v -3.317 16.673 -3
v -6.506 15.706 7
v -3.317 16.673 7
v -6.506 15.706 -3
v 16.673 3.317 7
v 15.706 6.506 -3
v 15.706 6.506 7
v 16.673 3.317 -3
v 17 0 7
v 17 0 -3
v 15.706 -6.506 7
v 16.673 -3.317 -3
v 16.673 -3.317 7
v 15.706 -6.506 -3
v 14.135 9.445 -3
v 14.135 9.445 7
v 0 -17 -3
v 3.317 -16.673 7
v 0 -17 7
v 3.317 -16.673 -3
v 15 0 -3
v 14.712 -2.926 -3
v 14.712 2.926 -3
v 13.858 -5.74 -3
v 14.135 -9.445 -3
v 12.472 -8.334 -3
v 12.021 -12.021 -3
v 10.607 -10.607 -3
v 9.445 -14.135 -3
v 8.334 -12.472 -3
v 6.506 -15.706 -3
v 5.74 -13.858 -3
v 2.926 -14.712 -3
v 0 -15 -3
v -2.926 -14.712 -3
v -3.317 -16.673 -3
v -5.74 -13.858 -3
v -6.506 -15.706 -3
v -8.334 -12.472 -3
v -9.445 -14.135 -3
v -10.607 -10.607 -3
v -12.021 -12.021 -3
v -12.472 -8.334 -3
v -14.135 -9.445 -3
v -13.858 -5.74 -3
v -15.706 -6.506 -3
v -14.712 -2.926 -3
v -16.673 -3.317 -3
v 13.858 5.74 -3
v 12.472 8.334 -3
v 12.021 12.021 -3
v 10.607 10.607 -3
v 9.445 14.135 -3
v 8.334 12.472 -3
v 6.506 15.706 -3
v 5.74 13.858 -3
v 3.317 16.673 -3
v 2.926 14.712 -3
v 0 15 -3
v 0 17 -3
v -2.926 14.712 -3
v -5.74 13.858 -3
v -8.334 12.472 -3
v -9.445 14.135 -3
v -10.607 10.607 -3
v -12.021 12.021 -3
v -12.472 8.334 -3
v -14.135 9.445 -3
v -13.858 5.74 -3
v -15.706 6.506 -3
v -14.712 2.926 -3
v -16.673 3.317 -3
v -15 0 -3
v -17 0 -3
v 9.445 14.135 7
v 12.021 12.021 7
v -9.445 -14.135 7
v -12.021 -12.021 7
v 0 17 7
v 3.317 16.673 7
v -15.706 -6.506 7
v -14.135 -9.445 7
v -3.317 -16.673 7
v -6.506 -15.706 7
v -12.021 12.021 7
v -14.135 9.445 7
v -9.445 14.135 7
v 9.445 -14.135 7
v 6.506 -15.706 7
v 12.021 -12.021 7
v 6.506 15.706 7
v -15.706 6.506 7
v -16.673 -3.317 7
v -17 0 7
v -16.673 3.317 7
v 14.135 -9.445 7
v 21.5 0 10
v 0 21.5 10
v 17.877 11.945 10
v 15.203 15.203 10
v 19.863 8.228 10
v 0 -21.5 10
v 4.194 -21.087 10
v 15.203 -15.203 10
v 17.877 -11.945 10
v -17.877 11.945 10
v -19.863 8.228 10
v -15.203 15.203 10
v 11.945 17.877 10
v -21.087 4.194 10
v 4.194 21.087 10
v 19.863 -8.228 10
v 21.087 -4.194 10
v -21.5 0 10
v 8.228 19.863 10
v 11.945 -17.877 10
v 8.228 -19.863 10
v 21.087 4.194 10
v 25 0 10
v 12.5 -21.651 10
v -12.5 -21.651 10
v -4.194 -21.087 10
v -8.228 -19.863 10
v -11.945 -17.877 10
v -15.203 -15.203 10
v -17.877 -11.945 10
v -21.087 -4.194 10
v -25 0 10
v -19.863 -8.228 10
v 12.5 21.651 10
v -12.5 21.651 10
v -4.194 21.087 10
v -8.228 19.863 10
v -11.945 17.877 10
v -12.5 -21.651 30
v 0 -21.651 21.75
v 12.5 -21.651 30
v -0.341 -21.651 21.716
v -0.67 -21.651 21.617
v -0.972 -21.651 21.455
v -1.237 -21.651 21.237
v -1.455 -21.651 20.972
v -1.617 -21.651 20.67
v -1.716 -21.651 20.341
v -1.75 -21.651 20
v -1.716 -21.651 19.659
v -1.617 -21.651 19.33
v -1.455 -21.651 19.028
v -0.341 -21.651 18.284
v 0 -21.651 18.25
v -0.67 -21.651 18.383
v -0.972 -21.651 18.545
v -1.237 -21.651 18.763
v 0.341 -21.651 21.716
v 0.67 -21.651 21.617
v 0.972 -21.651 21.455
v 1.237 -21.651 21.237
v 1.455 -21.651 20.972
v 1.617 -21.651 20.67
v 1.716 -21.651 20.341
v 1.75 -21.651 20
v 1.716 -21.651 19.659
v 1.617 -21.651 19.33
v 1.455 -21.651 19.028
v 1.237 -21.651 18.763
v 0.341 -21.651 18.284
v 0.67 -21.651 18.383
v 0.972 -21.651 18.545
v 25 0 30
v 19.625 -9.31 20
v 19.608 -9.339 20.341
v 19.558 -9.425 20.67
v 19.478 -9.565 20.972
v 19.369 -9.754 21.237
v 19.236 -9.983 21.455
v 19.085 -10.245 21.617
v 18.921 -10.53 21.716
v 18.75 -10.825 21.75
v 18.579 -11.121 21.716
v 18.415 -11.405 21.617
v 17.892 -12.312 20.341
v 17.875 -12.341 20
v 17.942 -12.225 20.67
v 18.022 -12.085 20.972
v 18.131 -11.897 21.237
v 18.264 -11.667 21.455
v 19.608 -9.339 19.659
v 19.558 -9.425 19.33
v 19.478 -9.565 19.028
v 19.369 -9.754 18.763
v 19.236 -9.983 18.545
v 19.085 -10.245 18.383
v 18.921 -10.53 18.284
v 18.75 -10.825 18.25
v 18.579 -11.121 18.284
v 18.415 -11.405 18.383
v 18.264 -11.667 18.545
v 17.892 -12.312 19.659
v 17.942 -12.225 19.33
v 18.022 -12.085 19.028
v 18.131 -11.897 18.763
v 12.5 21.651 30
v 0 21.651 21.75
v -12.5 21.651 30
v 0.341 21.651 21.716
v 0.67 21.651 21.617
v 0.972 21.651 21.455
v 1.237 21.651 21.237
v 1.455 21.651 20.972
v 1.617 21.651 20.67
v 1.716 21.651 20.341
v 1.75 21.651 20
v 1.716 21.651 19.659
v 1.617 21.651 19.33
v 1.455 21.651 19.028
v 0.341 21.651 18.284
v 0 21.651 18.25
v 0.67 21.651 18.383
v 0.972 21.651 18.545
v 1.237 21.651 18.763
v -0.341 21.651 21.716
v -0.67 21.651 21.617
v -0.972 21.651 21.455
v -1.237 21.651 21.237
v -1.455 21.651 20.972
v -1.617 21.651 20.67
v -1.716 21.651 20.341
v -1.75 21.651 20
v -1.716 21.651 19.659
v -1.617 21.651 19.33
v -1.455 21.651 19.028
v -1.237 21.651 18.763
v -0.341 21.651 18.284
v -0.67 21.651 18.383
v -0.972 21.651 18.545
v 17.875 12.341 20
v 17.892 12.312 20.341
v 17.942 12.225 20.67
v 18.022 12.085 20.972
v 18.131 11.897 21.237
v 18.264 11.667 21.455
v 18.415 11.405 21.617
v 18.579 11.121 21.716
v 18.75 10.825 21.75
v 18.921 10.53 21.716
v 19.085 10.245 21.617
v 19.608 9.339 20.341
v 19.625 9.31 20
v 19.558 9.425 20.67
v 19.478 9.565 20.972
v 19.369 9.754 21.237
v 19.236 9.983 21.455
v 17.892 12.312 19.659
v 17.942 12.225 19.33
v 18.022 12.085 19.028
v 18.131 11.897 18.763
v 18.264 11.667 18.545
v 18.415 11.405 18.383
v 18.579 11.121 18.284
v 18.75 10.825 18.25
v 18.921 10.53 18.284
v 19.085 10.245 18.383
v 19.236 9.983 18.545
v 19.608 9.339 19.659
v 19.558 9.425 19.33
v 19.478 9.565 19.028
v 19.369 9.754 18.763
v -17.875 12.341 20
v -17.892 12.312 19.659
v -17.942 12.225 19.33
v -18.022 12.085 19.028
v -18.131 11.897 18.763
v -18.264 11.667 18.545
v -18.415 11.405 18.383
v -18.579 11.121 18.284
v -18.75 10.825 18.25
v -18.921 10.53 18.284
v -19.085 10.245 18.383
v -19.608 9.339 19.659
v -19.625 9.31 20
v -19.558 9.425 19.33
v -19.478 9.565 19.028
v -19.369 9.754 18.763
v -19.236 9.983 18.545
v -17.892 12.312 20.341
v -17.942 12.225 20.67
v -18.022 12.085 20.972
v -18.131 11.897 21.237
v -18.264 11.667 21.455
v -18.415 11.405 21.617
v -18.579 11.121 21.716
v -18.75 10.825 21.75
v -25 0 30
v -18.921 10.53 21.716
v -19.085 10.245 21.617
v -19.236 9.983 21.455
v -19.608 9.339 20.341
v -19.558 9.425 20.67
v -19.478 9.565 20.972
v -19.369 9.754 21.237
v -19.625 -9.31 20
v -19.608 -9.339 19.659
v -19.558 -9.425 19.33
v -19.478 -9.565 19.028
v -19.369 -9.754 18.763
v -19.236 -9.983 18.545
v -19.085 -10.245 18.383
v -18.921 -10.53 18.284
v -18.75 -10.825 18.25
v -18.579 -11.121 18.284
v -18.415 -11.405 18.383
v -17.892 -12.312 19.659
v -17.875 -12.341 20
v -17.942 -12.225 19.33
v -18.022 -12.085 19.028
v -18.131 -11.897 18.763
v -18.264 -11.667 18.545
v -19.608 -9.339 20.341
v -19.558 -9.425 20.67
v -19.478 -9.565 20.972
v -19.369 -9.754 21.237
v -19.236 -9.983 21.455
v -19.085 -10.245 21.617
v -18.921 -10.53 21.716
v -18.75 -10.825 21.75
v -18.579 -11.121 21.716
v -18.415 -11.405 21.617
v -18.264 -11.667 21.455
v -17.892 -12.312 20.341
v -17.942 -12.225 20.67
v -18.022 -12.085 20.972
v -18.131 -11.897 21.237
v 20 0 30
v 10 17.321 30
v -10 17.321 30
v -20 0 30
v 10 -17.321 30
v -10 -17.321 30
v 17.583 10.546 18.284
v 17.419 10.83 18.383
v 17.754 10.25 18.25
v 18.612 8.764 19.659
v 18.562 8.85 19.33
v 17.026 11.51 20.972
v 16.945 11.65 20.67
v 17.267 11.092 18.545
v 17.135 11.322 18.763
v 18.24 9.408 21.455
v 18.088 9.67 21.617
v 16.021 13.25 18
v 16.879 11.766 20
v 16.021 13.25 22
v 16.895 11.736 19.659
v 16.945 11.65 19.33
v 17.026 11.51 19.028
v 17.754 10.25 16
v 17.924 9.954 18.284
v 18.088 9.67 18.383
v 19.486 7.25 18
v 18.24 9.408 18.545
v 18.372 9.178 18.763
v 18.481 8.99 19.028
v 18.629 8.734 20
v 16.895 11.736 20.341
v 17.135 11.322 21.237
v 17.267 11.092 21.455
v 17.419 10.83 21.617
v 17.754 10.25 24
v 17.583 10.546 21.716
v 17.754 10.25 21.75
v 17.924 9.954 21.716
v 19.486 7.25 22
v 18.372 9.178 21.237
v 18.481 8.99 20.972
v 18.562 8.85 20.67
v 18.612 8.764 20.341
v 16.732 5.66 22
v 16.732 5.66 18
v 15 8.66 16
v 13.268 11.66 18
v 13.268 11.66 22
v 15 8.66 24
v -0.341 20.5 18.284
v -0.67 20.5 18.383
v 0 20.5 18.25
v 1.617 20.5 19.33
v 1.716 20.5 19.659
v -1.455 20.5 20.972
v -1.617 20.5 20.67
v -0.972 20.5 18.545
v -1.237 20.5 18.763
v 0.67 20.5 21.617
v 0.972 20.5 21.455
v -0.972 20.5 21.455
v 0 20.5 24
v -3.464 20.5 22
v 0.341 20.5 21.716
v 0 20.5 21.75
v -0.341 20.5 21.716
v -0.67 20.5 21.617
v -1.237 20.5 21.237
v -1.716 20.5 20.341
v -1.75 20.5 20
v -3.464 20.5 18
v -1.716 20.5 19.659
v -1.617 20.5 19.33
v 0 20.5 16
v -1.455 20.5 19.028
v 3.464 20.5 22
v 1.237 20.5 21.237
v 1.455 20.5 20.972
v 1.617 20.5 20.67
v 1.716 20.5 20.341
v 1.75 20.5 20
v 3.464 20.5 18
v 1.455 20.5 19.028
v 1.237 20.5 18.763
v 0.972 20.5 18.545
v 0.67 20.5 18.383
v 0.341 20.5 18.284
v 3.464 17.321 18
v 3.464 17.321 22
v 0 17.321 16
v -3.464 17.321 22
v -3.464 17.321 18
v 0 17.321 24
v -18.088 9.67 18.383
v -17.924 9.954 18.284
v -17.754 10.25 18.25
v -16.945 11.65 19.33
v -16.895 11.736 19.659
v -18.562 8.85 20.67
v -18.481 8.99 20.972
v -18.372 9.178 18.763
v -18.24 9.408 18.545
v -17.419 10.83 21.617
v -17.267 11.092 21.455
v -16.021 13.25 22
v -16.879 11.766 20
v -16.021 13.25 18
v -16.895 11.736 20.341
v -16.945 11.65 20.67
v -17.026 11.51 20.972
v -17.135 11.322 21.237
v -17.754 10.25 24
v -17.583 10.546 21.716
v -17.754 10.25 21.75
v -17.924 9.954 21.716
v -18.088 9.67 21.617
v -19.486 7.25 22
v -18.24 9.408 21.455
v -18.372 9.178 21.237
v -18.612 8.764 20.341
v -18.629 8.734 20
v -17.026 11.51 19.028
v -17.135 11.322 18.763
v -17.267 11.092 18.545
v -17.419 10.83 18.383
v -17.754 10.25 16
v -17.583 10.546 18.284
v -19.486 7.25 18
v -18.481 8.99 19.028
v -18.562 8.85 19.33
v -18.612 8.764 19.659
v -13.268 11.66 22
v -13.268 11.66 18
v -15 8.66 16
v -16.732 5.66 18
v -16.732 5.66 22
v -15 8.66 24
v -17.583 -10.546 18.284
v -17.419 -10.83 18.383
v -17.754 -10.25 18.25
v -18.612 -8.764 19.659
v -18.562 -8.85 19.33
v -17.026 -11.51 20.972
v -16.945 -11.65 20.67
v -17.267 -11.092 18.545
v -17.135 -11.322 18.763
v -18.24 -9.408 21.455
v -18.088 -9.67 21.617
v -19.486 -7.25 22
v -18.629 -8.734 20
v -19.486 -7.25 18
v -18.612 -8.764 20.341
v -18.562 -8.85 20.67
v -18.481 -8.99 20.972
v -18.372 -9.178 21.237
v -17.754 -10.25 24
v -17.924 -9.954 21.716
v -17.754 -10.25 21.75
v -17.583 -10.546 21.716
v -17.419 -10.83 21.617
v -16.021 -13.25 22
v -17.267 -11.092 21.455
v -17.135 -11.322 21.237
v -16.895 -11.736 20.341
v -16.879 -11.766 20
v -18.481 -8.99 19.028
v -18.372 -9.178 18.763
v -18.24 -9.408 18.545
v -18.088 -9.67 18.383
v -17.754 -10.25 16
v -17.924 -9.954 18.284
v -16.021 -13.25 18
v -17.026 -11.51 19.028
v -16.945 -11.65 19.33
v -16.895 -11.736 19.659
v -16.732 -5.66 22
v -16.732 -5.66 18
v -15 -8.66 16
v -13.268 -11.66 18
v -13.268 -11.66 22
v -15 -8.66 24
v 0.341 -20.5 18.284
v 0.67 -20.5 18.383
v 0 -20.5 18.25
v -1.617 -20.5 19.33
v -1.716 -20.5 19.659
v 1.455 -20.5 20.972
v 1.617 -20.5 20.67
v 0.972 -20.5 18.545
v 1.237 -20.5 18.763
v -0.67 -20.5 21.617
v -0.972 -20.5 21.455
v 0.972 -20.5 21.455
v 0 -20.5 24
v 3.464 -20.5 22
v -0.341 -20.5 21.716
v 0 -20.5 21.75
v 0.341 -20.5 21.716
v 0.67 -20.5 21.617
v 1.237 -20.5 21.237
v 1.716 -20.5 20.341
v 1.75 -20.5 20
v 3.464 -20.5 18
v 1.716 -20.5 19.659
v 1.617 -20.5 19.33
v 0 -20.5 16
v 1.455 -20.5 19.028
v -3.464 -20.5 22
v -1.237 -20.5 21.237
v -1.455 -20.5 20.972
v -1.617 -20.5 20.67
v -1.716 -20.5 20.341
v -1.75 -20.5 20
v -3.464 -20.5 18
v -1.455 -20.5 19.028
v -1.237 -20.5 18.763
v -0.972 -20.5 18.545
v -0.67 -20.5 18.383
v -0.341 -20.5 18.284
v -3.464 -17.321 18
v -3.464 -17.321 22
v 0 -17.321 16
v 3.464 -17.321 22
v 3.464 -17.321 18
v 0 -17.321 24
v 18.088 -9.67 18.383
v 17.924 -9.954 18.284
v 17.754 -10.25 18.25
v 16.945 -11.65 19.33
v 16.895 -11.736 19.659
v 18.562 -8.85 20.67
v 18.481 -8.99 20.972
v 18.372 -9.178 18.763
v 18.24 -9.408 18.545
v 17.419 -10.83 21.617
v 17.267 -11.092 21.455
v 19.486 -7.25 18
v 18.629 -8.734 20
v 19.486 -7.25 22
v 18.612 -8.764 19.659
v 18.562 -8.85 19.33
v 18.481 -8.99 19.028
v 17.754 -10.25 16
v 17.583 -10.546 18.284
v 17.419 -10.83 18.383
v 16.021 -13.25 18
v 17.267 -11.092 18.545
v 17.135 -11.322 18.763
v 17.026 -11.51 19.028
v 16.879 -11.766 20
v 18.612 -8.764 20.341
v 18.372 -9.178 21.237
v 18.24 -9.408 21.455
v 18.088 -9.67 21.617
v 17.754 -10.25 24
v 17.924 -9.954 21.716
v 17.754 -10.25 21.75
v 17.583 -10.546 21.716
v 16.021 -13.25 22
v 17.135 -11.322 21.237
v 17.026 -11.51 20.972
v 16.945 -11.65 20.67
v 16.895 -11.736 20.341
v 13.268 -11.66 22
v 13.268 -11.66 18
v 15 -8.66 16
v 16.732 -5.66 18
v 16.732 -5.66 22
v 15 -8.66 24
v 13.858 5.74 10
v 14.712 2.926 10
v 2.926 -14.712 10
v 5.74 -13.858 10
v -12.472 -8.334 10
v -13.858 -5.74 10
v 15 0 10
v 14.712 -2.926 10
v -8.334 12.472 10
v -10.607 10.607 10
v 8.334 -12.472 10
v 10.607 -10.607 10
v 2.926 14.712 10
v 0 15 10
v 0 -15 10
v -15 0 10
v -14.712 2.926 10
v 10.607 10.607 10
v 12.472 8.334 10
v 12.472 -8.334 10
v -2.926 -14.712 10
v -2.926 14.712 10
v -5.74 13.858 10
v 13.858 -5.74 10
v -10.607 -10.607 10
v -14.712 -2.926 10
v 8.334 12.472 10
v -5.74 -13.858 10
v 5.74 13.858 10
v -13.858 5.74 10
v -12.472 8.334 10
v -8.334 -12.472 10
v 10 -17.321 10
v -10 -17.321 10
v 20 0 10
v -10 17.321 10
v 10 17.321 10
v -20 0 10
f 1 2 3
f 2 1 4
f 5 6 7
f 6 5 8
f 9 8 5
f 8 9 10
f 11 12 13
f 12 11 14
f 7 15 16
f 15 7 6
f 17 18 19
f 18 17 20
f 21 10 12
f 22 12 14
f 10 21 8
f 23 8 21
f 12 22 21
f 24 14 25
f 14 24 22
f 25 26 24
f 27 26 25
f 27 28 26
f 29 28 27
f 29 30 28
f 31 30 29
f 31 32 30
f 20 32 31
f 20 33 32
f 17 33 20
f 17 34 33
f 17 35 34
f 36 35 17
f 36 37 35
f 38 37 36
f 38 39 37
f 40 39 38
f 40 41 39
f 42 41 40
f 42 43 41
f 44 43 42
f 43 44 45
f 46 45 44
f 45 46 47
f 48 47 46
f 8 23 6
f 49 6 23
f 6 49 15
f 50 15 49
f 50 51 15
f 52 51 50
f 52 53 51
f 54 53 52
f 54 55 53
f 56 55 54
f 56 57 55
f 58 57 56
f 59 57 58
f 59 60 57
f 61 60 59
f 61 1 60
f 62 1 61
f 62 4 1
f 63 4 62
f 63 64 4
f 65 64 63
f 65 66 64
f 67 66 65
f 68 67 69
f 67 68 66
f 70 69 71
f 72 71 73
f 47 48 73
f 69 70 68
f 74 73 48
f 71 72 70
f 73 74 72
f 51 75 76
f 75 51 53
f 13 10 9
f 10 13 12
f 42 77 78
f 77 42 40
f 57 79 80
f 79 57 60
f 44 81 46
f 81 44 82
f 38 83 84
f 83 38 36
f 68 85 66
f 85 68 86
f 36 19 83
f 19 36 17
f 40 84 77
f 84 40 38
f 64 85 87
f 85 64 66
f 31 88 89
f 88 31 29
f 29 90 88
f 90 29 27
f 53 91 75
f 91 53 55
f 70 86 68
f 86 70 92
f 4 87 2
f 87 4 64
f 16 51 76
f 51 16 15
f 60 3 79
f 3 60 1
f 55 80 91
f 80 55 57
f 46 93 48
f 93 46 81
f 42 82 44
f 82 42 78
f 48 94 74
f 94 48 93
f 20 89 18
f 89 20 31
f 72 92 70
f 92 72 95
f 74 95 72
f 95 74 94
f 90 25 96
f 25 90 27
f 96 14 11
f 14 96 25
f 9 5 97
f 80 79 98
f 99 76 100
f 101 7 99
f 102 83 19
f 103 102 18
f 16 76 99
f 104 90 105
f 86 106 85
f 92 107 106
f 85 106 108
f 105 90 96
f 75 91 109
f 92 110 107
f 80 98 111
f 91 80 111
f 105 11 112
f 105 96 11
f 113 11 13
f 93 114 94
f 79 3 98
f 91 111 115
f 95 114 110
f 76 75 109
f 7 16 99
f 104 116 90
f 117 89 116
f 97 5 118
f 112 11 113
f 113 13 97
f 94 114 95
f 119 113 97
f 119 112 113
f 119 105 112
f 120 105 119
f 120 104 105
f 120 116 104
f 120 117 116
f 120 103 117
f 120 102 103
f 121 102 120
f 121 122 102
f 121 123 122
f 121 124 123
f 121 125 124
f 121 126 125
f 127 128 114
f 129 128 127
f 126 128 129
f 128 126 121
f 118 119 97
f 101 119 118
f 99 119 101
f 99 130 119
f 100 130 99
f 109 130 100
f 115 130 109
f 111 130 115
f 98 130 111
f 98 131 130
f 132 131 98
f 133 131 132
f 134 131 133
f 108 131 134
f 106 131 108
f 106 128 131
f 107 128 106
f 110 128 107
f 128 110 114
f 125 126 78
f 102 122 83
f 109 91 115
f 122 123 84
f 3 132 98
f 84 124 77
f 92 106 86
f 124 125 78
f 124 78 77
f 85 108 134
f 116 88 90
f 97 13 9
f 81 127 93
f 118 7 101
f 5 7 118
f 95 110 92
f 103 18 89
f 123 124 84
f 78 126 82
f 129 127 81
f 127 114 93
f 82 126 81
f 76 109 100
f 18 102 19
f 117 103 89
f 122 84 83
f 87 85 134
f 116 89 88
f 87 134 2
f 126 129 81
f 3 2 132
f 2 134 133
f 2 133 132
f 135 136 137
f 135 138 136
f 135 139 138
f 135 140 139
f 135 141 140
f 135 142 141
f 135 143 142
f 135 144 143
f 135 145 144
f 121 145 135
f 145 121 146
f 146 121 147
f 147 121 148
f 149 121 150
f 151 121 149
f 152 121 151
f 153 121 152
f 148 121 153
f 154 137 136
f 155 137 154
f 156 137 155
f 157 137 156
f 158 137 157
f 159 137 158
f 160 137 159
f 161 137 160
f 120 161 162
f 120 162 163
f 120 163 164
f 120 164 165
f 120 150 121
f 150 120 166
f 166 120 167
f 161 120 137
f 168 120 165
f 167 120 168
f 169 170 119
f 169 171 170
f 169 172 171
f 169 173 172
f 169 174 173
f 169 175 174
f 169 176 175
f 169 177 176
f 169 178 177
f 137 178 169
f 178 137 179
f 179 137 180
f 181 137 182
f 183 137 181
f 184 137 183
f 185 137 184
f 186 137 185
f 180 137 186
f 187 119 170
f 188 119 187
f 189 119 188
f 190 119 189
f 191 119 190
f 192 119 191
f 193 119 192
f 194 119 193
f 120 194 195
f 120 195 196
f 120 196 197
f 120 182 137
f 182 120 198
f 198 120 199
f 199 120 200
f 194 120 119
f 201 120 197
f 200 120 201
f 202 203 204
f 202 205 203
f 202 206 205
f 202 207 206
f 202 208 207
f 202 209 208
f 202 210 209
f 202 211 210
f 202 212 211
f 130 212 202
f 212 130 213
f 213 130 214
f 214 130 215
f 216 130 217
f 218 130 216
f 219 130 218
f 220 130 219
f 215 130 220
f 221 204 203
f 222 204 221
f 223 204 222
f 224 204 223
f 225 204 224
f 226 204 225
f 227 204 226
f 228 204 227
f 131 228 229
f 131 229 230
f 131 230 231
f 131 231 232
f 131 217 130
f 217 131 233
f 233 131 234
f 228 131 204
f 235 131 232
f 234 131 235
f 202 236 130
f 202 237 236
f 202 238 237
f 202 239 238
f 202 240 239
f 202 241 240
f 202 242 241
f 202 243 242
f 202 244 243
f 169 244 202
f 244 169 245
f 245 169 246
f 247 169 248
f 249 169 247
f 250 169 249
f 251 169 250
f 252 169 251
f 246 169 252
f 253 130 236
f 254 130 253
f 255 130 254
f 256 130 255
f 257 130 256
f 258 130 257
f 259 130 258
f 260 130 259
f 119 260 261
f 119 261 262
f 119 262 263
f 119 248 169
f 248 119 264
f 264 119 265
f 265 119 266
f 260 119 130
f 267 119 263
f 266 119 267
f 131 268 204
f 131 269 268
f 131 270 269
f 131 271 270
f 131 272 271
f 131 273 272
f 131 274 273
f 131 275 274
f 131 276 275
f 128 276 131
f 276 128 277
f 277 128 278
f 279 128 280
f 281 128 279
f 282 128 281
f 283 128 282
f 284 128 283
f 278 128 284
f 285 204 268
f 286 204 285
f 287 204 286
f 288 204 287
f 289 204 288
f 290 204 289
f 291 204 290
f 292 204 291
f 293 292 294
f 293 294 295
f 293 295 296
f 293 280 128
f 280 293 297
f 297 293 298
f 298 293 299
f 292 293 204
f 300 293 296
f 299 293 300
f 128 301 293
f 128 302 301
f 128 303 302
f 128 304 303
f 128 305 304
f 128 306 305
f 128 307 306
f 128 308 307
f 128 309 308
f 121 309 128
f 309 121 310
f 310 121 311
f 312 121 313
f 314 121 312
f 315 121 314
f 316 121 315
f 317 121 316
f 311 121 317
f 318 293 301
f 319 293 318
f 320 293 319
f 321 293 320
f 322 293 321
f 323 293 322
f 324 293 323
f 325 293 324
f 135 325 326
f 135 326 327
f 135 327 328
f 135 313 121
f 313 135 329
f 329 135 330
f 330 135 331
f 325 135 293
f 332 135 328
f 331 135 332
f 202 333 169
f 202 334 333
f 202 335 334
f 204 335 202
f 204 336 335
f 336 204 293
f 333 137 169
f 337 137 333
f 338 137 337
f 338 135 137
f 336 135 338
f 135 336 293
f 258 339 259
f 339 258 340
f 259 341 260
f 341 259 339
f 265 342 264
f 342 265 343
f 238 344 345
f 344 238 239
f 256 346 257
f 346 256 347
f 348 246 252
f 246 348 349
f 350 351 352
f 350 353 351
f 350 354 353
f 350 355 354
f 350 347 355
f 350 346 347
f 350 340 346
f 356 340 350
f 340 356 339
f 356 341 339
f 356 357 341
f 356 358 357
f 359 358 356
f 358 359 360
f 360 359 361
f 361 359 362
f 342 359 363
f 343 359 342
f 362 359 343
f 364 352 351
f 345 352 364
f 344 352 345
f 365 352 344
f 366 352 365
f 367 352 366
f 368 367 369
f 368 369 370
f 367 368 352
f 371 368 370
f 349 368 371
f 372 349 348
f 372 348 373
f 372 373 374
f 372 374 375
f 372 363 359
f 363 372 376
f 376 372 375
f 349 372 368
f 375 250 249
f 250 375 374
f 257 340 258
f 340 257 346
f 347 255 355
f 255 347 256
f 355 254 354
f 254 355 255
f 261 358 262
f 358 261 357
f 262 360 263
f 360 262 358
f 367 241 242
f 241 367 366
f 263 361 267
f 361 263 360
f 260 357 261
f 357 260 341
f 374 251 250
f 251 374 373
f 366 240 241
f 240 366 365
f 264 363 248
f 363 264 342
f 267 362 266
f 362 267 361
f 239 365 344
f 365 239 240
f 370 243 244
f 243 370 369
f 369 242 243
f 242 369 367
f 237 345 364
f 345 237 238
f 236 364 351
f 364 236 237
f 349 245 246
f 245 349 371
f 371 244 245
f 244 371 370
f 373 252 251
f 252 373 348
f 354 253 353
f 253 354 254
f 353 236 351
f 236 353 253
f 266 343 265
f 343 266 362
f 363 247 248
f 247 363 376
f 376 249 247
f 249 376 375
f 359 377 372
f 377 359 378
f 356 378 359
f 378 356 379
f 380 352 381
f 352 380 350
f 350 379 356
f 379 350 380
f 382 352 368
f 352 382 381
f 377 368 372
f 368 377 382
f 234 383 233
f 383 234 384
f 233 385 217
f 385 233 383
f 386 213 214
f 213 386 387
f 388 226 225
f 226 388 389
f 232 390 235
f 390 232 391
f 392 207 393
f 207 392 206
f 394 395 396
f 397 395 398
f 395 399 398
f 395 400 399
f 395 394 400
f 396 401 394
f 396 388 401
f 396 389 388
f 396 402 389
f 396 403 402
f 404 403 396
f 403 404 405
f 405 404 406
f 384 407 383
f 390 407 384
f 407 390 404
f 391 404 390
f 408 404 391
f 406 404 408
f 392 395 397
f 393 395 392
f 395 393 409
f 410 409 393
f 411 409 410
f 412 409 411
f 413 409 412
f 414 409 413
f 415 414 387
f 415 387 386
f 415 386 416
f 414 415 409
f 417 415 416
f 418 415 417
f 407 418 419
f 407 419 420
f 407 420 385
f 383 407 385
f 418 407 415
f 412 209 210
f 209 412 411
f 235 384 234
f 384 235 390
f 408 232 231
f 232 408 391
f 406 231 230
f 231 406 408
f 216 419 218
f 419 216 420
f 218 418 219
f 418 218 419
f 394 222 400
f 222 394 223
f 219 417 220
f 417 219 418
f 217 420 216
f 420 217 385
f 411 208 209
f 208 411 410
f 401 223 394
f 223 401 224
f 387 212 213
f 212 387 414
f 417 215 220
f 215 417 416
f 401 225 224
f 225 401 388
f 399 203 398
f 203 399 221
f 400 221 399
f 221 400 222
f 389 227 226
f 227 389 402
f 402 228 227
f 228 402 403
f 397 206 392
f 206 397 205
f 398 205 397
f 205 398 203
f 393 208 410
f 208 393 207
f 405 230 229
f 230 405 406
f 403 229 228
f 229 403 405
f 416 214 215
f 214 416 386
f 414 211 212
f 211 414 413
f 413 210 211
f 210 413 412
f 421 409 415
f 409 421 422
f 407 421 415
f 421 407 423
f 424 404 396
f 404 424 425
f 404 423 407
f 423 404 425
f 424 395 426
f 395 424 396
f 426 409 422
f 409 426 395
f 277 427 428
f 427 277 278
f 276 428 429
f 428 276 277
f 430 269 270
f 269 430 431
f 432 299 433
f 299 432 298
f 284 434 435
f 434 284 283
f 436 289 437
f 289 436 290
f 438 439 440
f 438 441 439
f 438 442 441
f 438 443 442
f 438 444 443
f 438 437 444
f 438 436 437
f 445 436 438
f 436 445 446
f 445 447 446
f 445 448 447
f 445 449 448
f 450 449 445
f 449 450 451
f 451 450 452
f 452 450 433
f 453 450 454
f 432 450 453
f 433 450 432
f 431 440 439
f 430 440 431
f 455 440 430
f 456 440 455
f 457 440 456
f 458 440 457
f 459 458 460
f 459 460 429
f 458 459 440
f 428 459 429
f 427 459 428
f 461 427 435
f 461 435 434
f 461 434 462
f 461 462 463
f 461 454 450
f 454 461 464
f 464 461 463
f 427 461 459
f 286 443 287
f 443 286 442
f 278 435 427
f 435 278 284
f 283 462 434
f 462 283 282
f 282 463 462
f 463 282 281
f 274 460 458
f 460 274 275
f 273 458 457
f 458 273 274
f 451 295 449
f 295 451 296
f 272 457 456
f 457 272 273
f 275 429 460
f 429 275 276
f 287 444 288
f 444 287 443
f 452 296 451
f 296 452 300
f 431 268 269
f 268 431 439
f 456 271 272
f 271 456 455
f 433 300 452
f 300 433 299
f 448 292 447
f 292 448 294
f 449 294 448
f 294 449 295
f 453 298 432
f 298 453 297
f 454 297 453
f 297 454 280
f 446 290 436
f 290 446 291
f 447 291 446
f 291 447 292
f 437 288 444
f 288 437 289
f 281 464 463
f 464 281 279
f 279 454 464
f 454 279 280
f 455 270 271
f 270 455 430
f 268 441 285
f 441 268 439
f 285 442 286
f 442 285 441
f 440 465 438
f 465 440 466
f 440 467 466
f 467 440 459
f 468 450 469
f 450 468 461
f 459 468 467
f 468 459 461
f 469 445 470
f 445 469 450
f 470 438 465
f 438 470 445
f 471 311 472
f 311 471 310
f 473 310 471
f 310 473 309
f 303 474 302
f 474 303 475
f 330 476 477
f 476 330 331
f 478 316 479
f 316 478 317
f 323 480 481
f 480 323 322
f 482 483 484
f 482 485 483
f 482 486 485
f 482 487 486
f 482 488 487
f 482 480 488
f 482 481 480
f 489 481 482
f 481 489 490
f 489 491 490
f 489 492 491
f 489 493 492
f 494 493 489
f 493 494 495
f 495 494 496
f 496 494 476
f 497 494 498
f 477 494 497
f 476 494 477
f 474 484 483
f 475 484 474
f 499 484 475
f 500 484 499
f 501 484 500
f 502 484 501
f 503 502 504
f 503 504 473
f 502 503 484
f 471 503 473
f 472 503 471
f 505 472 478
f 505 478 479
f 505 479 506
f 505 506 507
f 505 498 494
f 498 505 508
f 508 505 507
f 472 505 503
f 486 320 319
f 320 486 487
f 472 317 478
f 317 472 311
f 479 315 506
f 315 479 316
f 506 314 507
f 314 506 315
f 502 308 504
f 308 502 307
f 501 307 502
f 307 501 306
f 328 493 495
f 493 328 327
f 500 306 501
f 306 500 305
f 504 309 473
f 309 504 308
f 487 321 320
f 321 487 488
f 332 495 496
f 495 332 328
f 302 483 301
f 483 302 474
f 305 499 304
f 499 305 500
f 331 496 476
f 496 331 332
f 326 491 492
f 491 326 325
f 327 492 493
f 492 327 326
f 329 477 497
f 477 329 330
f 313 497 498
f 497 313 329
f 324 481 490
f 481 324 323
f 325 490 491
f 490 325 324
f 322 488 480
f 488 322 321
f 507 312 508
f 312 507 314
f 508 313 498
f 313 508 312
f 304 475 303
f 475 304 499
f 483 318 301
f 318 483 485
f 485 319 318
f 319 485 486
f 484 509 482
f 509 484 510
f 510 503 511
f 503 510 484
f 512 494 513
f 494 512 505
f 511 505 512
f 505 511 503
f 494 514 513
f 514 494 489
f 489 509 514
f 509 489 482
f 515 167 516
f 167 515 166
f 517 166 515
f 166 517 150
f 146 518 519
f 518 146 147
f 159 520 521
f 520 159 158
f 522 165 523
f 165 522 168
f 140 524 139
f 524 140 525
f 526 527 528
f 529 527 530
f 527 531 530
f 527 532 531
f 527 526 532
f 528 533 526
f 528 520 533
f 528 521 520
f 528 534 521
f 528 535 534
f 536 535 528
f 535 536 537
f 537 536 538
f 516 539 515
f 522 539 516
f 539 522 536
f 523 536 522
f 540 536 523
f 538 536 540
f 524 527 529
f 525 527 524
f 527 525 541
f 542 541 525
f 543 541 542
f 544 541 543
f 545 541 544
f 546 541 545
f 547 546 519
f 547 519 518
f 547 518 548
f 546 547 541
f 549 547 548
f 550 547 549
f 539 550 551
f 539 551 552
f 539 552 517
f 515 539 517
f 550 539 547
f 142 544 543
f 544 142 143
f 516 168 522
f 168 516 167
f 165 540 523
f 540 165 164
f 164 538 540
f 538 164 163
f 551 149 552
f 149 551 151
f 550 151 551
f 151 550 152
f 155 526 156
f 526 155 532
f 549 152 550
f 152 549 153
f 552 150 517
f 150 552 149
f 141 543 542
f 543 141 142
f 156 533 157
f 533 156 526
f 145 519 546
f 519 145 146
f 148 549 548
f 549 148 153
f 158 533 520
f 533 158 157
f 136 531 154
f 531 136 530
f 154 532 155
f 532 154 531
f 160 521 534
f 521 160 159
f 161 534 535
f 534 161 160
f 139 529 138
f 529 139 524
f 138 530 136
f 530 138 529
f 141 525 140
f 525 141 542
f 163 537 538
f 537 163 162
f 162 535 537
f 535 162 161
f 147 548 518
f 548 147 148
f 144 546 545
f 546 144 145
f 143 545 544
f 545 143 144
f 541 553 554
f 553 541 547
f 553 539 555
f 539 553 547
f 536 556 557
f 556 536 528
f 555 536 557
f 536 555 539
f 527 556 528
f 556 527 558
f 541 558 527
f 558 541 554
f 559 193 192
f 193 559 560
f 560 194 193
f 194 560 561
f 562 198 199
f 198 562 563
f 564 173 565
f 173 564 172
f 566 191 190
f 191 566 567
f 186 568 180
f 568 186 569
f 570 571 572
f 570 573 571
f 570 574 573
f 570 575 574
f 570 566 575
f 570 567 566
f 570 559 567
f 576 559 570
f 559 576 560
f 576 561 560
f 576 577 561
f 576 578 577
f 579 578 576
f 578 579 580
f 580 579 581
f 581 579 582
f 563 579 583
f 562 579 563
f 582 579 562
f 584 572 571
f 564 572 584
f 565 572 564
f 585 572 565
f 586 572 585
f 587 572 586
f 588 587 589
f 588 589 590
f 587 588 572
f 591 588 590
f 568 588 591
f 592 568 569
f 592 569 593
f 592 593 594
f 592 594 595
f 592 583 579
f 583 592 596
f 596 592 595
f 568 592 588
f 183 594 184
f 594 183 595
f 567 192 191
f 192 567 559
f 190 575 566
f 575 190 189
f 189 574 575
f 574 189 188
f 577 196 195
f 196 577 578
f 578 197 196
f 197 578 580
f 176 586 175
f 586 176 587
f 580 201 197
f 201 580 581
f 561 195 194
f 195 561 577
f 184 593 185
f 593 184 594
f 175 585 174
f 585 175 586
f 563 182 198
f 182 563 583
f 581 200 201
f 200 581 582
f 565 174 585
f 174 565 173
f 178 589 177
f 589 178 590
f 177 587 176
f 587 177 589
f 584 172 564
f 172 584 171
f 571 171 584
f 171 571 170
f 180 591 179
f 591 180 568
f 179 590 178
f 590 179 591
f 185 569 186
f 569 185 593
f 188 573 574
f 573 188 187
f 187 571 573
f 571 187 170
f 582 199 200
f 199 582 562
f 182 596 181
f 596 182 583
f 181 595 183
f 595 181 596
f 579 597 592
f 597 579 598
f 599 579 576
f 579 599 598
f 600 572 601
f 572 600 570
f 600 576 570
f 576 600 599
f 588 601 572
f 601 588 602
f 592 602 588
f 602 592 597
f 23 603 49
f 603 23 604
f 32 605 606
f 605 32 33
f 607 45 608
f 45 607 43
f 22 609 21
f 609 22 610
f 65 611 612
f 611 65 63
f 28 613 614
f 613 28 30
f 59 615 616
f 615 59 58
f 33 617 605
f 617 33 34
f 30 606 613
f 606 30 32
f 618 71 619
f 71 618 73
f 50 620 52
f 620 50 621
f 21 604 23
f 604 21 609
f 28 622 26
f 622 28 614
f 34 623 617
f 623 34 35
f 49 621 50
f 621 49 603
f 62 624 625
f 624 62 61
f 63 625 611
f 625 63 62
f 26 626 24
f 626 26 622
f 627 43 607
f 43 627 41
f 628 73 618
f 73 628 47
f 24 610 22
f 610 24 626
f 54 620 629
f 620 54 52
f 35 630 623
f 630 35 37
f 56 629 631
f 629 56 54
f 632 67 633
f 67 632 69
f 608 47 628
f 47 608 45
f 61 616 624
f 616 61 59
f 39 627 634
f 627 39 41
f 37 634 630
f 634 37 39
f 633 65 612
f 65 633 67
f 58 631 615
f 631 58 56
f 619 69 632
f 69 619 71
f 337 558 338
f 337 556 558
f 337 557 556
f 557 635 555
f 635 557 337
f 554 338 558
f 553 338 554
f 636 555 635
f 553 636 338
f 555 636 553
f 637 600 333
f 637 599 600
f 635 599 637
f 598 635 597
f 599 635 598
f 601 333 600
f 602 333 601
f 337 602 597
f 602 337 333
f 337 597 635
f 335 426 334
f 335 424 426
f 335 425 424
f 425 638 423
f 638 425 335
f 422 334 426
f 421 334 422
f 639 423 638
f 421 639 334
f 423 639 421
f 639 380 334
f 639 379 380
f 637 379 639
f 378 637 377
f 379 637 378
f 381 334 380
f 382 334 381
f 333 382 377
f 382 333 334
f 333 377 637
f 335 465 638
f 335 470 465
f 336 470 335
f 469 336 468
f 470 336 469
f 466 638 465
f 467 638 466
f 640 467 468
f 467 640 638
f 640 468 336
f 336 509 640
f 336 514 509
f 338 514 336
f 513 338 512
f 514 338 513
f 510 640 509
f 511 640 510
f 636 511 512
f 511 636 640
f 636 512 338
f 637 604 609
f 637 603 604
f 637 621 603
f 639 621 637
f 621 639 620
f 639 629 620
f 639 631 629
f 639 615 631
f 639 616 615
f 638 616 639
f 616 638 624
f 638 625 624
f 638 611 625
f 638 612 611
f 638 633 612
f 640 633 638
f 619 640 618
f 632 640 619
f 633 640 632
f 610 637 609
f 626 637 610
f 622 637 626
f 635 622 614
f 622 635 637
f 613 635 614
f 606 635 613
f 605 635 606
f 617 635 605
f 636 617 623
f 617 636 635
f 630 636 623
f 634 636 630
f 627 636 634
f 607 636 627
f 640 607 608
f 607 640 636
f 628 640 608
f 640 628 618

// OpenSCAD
$fn=32;



module template(){
	import("camera_microscope_adapter_2_holes_repaired.stl");
} //template();

module adapter(){
difference(){
	union(){
		translate([0,0,2]) cylinder(h=10, d=34, center=true);
		translate([0,0,7]) cylinder(h=3,r1=17,r2=21.5,center=false);
		translate([0,0,10]) cylinder(h=20,r=25,center=false, $fn=6);
	}
	translate([0,0,3]) cylinder(h=15, d=30, center=true);
	translate([0,0,10]) cylinder(h=21,r=20,center=false, $fn=6);
	for(i=[0:60:360]){
	rotate([0,0,i]) M3();
}
}
} adapter();

module M3(){
	rotate([0,0,30])
	translate([16.5,00,20])
	rotate([0,90,0])
	union() {
		translate([0,0,4]) cylinder(h=10, d=3.5, center=false);
		cylinder(h=4, d=8, center=false,$fn=6);
	}
} //M3();
